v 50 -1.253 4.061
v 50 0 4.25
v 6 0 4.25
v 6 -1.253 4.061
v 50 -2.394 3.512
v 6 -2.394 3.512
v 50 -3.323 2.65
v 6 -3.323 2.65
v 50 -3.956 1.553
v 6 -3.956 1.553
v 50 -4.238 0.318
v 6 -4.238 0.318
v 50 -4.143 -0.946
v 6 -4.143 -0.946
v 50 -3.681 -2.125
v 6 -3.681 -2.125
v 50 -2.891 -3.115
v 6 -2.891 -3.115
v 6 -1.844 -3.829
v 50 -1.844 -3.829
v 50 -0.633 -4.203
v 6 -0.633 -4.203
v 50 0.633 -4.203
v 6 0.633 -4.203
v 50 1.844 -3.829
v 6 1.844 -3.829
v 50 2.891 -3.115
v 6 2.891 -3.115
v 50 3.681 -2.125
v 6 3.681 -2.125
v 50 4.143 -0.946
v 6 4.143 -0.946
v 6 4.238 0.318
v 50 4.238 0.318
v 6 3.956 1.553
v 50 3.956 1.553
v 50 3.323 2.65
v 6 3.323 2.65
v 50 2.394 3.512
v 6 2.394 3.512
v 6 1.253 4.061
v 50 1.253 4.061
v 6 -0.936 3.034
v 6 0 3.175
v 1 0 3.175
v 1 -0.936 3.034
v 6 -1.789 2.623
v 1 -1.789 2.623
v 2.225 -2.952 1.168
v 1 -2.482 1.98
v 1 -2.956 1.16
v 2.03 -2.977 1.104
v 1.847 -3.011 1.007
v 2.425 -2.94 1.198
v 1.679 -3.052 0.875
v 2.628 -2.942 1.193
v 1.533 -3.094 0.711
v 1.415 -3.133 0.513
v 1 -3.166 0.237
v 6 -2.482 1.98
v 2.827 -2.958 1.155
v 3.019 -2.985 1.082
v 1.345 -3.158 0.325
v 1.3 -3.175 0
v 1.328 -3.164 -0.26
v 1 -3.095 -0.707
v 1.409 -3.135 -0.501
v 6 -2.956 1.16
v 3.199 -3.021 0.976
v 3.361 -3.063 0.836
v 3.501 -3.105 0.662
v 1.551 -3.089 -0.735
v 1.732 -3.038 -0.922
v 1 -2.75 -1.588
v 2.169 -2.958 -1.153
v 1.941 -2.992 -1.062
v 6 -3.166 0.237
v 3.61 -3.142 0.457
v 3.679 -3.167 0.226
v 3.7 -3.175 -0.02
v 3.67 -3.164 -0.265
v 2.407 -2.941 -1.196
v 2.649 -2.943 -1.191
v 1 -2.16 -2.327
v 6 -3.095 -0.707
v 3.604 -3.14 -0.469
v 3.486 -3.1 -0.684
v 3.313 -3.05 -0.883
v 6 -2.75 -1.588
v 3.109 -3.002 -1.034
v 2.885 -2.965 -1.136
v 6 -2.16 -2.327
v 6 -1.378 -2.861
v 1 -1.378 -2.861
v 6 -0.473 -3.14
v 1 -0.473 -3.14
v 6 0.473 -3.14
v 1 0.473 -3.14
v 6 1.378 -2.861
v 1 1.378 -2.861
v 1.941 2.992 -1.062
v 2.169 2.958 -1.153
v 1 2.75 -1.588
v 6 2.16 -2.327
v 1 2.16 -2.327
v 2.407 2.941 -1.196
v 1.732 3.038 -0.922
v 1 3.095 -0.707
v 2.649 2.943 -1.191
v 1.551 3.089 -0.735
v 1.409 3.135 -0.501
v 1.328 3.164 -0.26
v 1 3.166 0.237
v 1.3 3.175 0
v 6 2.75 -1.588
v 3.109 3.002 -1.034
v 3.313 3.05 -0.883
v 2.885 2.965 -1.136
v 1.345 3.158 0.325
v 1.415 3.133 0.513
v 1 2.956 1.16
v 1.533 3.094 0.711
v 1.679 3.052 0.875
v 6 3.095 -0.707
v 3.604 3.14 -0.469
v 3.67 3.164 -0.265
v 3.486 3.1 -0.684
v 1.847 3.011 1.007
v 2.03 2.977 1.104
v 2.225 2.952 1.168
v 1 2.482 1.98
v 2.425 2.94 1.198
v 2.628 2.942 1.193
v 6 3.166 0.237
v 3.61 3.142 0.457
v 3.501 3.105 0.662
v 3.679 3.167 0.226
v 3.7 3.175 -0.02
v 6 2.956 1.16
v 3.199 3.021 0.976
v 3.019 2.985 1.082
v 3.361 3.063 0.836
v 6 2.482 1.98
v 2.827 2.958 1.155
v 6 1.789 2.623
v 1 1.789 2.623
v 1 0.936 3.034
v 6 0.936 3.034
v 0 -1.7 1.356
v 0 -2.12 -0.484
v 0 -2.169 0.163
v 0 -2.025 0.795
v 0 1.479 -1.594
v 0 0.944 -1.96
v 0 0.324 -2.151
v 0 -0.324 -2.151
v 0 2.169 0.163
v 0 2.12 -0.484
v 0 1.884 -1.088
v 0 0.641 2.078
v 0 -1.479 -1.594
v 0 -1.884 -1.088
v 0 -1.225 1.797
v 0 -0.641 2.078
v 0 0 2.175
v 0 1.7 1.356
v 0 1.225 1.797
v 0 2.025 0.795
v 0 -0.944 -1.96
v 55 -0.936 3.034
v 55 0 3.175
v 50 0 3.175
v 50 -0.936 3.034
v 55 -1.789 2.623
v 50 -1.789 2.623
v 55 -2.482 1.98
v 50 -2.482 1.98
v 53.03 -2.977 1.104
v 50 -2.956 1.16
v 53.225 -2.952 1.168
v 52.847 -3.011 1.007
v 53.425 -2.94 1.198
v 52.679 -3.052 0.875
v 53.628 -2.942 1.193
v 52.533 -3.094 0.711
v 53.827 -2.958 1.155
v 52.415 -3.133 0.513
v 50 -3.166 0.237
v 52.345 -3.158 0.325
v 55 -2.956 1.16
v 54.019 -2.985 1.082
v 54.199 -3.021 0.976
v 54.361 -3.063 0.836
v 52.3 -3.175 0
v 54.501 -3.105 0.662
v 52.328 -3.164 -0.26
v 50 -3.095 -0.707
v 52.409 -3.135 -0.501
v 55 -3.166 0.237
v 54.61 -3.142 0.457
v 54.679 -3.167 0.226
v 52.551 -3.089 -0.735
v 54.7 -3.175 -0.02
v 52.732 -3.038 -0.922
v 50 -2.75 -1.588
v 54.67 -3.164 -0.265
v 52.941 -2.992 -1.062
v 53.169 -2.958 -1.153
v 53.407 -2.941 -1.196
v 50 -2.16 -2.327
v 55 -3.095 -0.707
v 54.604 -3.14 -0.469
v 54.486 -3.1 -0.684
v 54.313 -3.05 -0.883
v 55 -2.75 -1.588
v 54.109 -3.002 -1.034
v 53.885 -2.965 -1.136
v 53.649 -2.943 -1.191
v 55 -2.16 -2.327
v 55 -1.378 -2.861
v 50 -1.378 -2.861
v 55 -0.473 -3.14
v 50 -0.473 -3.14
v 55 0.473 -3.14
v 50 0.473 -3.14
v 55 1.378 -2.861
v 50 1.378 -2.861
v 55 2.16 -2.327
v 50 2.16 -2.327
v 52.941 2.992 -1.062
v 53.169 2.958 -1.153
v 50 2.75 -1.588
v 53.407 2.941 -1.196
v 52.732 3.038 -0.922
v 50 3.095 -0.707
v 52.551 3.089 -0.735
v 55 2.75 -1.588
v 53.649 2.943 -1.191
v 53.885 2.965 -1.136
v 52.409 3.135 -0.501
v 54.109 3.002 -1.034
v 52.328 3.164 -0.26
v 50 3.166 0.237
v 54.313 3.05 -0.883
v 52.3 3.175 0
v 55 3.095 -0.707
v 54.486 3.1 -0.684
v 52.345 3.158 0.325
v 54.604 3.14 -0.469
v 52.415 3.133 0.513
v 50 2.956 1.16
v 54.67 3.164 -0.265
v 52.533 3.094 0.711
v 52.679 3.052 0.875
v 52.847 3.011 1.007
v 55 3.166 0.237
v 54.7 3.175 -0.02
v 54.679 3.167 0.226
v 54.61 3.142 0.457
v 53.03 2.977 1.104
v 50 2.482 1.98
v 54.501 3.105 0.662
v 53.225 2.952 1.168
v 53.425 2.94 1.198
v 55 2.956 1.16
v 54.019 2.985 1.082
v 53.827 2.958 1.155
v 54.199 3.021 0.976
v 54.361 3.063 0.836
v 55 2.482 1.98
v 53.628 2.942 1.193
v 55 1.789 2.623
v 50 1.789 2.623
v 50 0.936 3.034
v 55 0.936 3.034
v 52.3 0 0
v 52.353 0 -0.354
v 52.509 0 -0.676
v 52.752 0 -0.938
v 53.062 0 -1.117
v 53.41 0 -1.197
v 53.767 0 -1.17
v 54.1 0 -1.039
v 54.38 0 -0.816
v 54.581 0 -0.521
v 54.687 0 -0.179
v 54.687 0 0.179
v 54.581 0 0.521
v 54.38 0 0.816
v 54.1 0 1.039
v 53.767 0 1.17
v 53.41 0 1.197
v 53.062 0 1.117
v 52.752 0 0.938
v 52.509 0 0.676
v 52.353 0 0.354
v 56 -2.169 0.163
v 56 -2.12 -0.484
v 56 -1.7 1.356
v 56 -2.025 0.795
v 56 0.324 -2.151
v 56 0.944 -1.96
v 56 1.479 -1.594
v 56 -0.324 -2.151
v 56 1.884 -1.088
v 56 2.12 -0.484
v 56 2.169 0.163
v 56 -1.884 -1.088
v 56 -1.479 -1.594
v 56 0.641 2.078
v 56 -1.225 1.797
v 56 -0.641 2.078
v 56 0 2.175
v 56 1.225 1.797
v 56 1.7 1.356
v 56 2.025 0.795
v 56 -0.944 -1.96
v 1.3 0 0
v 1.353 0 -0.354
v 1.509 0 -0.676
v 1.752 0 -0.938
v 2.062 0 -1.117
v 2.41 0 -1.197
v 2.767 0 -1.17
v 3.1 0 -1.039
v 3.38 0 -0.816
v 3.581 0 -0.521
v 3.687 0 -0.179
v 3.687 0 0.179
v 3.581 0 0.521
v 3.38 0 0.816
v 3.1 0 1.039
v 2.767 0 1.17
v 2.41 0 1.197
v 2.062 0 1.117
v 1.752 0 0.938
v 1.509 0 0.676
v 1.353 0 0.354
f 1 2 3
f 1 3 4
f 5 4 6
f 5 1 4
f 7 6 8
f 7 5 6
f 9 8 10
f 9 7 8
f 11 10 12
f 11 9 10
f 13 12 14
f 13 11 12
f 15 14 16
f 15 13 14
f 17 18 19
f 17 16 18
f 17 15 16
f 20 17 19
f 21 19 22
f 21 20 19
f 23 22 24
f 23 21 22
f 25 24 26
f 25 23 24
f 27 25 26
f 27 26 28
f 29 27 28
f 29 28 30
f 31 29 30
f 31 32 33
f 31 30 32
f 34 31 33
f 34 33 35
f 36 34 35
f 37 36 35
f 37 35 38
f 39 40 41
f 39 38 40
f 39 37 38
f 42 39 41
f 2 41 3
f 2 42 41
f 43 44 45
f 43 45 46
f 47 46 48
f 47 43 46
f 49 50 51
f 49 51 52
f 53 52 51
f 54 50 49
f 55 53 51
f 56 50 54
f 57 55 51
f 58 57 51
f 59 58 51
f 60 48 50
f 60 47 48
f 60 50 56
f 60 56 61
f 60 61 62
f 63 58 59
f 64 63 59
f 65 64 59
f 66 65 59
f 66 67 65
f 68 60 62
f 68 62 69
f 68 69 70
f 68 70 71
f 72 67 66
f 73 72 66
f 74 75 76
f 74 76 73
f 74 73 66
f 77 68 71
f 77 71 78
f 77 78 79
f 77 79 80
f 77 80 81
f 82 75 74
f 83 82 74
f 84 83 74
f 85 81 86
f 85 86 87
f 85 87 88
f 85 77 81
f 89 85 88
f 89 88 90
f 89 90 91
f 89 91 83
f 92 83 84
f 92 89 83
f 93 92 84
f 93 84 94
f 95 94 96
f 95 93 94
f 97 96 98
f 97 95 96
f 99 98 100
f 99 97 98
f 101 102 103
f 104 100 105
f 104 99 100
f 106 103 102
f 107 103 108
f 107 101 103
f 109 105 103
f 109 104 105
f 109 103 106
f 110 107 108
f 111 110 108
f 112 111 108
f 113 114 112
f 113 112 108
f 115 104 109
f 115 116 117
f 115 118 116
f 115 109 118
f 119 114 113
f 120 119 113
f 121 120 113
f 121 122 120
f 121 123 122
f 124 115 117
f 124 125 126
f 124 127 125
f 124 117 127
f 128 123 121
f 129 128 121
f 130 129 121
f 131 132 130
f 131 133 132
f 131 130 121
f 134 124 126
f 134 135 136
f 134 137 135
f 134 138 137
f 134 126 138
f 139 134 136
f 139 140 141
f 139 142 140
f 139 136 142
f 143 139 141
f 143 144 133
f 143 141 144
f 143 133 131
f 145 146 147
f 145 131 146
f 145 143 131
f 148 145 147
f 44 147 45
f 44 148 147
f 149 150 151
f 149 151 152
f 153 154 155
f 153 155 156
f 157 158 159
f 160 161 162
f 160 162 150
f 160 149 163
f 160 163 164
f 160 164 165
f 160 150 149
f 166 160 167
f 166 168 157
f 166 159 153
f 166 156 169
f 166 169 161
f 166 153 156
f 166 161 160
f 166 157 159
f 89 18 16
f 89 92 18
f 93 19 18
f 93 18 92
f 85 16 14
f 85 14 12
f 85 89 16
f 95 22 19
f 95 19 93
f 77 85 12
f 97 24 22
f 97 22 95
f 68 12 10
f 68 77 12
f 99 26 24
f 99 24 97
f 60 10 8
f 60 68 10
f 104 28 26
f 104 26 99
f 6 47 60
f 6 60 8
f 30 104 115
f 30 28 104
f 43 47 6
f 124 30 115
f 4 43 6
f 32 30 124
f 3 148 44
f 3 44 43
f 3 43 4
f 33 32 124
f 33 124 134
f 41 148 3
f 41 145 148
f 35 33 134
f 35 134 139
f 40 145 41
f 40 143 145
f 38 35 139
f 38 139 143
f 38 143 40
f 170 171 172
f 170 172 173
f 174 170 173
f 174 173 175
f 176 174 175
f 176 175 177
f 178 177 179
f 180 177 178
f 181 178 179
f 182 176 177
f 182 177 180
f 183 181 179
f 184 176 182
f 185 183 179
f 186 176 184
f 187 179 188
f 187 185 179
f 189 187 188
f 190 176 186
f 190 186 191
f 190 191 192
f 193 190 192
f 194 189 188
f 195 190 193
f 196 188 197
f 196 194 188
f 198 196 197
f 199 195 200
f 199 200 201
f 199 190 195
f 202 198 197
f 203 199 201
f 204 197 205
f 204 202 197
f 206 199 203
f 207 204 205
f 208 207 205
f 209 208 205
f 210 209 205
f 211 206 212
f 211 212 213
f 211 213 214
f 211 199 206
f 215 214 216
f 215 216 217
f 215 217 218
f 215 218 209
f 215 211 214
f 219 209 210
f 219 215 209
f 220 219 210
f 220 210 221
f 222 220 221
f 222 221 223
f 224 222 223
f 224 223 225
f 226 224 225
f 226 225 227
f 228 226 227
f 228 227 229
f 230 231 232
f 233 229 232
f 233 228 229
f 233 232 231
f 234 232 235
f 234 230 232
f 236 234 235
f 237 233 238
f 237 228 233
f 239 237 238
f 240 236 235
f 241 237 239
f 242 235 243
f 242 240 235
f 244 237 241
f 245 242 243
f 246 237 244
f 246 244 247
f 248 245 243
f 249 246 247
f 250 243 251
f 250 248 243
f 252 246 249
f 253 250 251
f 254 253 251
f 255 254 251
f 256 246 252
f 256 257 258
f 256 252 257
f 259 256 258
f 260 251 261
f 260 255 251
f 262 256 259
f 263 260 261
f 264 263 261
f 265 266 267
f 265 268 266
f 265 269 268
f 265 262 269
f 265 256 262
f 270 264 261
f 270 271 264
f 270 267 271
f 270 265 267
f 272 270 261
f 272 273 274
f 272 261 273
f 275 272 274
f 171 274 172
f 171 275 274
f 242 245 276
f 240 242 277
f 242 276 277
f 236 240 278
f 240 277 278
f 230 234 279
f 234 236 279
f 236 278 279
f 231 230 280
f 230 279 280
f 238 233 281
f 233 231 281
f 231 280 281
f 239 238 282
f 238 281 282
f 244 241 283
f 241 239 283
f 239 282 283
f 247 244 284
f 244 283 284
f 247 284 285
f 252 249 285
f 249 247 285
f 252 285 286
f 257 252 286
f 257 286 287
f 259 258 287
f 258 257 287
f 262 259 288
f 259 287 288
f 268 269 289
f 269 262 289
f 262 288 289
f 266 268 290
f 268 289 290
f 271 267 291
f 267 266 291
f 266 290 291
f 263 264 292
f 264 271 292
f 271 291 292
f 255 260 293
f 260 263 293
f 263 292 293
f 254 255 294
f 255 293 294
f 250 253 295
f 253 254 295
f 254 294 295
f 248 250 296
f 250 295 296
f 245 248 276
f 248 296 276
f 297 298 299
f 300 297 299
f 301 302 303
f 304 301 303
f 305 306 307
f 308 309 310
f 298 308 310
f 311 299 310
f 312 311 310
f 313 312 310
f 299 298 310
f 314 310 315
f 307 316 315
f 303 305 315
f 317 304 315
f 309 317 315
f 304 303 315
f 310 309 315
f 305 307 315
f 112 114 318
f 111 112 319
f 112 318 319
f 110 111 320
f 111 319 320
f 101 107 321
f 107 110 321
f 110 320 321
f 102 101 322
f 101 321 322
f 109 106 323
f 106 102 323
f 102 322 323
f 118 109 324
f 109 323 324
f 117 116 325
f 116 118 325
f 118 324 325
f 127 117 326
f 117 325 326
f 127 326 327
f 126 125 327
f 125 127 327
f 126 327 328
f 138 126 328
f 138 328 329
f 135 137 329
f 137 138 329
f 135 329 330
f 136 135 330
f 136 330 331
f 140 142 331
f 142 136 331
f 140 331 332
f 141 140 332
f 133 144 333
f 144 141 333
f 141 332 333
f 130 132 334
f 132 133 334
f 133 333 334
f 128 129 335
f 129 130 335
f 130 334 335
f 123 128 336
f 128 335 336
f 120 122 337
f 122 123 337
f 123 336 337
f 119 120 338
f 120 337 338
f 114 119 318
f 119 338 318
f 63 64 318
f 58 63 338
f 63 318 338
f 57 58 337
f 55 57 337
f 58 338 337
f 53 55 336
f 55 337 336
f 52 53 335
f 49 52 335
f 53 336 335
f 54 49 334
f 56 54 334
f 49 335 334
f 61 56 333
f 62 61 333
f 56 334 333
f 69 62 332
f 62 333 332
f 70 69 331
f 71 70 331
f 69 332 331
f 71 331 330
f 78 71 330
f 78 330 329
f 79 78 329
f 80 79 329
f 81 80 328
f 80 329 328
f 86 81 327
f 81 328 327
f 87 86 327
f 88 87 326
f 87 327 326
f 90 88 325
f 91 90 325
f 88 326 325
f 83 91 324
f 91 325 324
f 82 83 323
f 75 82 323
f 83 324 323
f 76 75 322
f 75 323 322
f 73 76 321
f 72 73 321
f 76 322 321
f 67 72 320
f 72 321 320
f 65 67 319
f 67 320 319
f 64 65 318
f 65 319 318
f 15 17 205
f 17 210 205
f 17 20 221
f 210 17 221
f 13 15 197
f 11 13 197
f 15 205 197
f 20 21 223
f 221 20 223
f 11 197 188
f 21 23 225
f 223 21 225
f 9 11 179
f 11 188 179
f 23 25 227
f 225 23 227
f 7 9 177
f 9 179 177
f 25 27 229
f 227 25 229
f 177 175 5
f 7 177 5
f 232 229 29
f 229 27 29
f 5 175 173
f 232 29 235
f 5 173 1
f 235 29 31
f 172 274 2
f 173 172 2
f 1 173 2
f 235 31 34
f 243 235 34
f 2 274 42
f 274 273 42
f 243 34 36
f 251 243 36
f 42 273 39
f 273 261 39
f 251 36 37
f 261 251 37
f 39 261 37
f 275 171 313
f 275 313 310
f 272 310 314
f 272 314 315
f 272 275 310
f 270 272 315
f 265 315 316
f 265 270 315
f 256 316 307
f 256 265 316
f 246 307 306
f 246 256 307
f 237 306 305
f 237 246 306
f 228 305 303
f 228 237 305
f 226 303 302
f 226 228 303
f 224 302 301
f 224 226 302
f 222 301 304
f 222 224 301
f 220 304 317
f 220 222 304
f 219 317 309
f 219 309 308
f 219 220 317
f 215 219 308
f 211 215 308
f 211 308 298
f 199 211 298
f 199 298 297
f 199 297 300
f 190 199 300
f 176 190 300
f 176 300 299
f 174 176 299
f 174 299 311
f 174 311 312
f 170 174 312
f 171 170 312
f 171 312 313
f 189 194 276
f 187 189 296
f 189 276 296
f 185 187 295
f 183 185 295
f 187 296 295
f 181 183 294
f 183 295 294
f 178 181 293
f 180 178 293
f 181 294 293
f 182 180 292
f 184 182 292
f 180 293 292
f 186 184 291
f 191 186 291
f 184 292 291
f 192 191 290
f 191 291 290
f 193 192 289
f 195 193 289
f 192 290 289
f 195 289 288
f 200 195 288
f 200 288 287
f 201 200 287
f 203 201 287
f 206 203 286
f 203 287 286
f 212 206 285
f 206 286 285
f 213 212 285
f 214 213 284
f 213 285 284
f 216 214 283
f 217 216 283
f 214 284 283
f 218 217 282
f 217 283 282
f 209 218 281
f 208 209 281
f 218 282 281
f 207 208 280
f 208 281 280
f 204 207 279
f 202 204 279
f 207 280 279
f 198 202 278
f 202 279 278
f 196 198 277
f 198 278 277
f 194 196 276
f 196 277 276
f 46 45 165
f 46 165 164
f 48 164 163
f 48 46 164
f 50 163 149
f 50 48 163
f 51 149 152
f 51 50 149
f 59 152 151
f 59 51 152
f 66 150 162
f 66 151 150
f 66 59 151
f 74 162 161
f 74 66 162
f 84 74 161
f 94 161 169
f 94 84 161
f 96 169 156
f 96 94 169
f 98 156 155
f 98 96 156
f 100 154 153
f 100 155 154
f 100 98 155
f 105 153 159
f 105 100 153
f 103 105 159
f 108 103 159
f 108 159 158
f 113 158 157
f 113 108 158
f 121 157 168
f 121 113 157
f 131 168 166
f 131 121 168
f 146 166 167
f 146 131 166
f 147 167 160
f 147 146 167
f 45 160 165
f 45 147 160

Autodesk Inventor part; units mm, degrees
ref_plane "YZ Plane" through (0, 0, 0) normal (1, 0, 0) x (0, 1, 0)
ref_plane "XZ Plane" through (0, 0, 0) normal (0, 1, 0) x (-1, 0, 0)
sketch "Sketch1" plane through (0, 0, 0) normal (0, 1, 0) x (-1, 0, 0)
  line L0 (0, 0) -> (0, 3.175)
  line L1 (0, 3.175) -> (-6, 3.175)
  line L2 (-6, 3.175) -> (-6, 4.25)
  line L3 (-6, 4.25) -> (-50, 4.25)
  line L4 (-50, 4.25) -> (-50, 3.175)
  line L5 (-50, 3.175) -> (-56, 3.175)
  line L6 (-56, 3.175) -> (-56, 0)
  line L7 (-56, 0) -> (0, 0)
  dimension "d0" = 56
  dimension "d1" = 6
  dimension "d2" = 6
  dimension "d3" = 4.25
  dimension "d4" = 3.175
revolve "Revolution1" add sketch "Sketch1" angle 360 about axis through (56, 0, 0) along (-1, 0, 0)
chamfer "Chamfer1" distance 1 angle 45 2 edges at (0, 0, -3.175) (56, 0, -3.175)
sketch "Sketch2" plane through (0, 0, 0) normal (0, 1, 0) x (-1, 0, 0)
  circle A0 centre (-2.5, 0) radius 1.2
  line L0 (0, 2.175) -> (0, -2.175) projected
  circle A1 centre (-53.5, 0) radius 1.2
  line L1 (-56, -2.175) -> (-56, 2.175) projected
  point P0 (0, 0)
  point P1 (0, 0)
  point P2 (-56, 0)
  dimension "d9" = 2.4
  dimension "d10" = 2.5
  dimension "d11" = 2.4
  dimension "d12" = 2.5
extrude "Extrusion1" cut sketch "Sketch2" along normal mid plane 10
ref_plane "Work Plane1" through (28, 0, 0) normal (-1, 0, 0) x (0, 0, 1)
properties part number "Cannon Pin" material "Iron, Cast"
